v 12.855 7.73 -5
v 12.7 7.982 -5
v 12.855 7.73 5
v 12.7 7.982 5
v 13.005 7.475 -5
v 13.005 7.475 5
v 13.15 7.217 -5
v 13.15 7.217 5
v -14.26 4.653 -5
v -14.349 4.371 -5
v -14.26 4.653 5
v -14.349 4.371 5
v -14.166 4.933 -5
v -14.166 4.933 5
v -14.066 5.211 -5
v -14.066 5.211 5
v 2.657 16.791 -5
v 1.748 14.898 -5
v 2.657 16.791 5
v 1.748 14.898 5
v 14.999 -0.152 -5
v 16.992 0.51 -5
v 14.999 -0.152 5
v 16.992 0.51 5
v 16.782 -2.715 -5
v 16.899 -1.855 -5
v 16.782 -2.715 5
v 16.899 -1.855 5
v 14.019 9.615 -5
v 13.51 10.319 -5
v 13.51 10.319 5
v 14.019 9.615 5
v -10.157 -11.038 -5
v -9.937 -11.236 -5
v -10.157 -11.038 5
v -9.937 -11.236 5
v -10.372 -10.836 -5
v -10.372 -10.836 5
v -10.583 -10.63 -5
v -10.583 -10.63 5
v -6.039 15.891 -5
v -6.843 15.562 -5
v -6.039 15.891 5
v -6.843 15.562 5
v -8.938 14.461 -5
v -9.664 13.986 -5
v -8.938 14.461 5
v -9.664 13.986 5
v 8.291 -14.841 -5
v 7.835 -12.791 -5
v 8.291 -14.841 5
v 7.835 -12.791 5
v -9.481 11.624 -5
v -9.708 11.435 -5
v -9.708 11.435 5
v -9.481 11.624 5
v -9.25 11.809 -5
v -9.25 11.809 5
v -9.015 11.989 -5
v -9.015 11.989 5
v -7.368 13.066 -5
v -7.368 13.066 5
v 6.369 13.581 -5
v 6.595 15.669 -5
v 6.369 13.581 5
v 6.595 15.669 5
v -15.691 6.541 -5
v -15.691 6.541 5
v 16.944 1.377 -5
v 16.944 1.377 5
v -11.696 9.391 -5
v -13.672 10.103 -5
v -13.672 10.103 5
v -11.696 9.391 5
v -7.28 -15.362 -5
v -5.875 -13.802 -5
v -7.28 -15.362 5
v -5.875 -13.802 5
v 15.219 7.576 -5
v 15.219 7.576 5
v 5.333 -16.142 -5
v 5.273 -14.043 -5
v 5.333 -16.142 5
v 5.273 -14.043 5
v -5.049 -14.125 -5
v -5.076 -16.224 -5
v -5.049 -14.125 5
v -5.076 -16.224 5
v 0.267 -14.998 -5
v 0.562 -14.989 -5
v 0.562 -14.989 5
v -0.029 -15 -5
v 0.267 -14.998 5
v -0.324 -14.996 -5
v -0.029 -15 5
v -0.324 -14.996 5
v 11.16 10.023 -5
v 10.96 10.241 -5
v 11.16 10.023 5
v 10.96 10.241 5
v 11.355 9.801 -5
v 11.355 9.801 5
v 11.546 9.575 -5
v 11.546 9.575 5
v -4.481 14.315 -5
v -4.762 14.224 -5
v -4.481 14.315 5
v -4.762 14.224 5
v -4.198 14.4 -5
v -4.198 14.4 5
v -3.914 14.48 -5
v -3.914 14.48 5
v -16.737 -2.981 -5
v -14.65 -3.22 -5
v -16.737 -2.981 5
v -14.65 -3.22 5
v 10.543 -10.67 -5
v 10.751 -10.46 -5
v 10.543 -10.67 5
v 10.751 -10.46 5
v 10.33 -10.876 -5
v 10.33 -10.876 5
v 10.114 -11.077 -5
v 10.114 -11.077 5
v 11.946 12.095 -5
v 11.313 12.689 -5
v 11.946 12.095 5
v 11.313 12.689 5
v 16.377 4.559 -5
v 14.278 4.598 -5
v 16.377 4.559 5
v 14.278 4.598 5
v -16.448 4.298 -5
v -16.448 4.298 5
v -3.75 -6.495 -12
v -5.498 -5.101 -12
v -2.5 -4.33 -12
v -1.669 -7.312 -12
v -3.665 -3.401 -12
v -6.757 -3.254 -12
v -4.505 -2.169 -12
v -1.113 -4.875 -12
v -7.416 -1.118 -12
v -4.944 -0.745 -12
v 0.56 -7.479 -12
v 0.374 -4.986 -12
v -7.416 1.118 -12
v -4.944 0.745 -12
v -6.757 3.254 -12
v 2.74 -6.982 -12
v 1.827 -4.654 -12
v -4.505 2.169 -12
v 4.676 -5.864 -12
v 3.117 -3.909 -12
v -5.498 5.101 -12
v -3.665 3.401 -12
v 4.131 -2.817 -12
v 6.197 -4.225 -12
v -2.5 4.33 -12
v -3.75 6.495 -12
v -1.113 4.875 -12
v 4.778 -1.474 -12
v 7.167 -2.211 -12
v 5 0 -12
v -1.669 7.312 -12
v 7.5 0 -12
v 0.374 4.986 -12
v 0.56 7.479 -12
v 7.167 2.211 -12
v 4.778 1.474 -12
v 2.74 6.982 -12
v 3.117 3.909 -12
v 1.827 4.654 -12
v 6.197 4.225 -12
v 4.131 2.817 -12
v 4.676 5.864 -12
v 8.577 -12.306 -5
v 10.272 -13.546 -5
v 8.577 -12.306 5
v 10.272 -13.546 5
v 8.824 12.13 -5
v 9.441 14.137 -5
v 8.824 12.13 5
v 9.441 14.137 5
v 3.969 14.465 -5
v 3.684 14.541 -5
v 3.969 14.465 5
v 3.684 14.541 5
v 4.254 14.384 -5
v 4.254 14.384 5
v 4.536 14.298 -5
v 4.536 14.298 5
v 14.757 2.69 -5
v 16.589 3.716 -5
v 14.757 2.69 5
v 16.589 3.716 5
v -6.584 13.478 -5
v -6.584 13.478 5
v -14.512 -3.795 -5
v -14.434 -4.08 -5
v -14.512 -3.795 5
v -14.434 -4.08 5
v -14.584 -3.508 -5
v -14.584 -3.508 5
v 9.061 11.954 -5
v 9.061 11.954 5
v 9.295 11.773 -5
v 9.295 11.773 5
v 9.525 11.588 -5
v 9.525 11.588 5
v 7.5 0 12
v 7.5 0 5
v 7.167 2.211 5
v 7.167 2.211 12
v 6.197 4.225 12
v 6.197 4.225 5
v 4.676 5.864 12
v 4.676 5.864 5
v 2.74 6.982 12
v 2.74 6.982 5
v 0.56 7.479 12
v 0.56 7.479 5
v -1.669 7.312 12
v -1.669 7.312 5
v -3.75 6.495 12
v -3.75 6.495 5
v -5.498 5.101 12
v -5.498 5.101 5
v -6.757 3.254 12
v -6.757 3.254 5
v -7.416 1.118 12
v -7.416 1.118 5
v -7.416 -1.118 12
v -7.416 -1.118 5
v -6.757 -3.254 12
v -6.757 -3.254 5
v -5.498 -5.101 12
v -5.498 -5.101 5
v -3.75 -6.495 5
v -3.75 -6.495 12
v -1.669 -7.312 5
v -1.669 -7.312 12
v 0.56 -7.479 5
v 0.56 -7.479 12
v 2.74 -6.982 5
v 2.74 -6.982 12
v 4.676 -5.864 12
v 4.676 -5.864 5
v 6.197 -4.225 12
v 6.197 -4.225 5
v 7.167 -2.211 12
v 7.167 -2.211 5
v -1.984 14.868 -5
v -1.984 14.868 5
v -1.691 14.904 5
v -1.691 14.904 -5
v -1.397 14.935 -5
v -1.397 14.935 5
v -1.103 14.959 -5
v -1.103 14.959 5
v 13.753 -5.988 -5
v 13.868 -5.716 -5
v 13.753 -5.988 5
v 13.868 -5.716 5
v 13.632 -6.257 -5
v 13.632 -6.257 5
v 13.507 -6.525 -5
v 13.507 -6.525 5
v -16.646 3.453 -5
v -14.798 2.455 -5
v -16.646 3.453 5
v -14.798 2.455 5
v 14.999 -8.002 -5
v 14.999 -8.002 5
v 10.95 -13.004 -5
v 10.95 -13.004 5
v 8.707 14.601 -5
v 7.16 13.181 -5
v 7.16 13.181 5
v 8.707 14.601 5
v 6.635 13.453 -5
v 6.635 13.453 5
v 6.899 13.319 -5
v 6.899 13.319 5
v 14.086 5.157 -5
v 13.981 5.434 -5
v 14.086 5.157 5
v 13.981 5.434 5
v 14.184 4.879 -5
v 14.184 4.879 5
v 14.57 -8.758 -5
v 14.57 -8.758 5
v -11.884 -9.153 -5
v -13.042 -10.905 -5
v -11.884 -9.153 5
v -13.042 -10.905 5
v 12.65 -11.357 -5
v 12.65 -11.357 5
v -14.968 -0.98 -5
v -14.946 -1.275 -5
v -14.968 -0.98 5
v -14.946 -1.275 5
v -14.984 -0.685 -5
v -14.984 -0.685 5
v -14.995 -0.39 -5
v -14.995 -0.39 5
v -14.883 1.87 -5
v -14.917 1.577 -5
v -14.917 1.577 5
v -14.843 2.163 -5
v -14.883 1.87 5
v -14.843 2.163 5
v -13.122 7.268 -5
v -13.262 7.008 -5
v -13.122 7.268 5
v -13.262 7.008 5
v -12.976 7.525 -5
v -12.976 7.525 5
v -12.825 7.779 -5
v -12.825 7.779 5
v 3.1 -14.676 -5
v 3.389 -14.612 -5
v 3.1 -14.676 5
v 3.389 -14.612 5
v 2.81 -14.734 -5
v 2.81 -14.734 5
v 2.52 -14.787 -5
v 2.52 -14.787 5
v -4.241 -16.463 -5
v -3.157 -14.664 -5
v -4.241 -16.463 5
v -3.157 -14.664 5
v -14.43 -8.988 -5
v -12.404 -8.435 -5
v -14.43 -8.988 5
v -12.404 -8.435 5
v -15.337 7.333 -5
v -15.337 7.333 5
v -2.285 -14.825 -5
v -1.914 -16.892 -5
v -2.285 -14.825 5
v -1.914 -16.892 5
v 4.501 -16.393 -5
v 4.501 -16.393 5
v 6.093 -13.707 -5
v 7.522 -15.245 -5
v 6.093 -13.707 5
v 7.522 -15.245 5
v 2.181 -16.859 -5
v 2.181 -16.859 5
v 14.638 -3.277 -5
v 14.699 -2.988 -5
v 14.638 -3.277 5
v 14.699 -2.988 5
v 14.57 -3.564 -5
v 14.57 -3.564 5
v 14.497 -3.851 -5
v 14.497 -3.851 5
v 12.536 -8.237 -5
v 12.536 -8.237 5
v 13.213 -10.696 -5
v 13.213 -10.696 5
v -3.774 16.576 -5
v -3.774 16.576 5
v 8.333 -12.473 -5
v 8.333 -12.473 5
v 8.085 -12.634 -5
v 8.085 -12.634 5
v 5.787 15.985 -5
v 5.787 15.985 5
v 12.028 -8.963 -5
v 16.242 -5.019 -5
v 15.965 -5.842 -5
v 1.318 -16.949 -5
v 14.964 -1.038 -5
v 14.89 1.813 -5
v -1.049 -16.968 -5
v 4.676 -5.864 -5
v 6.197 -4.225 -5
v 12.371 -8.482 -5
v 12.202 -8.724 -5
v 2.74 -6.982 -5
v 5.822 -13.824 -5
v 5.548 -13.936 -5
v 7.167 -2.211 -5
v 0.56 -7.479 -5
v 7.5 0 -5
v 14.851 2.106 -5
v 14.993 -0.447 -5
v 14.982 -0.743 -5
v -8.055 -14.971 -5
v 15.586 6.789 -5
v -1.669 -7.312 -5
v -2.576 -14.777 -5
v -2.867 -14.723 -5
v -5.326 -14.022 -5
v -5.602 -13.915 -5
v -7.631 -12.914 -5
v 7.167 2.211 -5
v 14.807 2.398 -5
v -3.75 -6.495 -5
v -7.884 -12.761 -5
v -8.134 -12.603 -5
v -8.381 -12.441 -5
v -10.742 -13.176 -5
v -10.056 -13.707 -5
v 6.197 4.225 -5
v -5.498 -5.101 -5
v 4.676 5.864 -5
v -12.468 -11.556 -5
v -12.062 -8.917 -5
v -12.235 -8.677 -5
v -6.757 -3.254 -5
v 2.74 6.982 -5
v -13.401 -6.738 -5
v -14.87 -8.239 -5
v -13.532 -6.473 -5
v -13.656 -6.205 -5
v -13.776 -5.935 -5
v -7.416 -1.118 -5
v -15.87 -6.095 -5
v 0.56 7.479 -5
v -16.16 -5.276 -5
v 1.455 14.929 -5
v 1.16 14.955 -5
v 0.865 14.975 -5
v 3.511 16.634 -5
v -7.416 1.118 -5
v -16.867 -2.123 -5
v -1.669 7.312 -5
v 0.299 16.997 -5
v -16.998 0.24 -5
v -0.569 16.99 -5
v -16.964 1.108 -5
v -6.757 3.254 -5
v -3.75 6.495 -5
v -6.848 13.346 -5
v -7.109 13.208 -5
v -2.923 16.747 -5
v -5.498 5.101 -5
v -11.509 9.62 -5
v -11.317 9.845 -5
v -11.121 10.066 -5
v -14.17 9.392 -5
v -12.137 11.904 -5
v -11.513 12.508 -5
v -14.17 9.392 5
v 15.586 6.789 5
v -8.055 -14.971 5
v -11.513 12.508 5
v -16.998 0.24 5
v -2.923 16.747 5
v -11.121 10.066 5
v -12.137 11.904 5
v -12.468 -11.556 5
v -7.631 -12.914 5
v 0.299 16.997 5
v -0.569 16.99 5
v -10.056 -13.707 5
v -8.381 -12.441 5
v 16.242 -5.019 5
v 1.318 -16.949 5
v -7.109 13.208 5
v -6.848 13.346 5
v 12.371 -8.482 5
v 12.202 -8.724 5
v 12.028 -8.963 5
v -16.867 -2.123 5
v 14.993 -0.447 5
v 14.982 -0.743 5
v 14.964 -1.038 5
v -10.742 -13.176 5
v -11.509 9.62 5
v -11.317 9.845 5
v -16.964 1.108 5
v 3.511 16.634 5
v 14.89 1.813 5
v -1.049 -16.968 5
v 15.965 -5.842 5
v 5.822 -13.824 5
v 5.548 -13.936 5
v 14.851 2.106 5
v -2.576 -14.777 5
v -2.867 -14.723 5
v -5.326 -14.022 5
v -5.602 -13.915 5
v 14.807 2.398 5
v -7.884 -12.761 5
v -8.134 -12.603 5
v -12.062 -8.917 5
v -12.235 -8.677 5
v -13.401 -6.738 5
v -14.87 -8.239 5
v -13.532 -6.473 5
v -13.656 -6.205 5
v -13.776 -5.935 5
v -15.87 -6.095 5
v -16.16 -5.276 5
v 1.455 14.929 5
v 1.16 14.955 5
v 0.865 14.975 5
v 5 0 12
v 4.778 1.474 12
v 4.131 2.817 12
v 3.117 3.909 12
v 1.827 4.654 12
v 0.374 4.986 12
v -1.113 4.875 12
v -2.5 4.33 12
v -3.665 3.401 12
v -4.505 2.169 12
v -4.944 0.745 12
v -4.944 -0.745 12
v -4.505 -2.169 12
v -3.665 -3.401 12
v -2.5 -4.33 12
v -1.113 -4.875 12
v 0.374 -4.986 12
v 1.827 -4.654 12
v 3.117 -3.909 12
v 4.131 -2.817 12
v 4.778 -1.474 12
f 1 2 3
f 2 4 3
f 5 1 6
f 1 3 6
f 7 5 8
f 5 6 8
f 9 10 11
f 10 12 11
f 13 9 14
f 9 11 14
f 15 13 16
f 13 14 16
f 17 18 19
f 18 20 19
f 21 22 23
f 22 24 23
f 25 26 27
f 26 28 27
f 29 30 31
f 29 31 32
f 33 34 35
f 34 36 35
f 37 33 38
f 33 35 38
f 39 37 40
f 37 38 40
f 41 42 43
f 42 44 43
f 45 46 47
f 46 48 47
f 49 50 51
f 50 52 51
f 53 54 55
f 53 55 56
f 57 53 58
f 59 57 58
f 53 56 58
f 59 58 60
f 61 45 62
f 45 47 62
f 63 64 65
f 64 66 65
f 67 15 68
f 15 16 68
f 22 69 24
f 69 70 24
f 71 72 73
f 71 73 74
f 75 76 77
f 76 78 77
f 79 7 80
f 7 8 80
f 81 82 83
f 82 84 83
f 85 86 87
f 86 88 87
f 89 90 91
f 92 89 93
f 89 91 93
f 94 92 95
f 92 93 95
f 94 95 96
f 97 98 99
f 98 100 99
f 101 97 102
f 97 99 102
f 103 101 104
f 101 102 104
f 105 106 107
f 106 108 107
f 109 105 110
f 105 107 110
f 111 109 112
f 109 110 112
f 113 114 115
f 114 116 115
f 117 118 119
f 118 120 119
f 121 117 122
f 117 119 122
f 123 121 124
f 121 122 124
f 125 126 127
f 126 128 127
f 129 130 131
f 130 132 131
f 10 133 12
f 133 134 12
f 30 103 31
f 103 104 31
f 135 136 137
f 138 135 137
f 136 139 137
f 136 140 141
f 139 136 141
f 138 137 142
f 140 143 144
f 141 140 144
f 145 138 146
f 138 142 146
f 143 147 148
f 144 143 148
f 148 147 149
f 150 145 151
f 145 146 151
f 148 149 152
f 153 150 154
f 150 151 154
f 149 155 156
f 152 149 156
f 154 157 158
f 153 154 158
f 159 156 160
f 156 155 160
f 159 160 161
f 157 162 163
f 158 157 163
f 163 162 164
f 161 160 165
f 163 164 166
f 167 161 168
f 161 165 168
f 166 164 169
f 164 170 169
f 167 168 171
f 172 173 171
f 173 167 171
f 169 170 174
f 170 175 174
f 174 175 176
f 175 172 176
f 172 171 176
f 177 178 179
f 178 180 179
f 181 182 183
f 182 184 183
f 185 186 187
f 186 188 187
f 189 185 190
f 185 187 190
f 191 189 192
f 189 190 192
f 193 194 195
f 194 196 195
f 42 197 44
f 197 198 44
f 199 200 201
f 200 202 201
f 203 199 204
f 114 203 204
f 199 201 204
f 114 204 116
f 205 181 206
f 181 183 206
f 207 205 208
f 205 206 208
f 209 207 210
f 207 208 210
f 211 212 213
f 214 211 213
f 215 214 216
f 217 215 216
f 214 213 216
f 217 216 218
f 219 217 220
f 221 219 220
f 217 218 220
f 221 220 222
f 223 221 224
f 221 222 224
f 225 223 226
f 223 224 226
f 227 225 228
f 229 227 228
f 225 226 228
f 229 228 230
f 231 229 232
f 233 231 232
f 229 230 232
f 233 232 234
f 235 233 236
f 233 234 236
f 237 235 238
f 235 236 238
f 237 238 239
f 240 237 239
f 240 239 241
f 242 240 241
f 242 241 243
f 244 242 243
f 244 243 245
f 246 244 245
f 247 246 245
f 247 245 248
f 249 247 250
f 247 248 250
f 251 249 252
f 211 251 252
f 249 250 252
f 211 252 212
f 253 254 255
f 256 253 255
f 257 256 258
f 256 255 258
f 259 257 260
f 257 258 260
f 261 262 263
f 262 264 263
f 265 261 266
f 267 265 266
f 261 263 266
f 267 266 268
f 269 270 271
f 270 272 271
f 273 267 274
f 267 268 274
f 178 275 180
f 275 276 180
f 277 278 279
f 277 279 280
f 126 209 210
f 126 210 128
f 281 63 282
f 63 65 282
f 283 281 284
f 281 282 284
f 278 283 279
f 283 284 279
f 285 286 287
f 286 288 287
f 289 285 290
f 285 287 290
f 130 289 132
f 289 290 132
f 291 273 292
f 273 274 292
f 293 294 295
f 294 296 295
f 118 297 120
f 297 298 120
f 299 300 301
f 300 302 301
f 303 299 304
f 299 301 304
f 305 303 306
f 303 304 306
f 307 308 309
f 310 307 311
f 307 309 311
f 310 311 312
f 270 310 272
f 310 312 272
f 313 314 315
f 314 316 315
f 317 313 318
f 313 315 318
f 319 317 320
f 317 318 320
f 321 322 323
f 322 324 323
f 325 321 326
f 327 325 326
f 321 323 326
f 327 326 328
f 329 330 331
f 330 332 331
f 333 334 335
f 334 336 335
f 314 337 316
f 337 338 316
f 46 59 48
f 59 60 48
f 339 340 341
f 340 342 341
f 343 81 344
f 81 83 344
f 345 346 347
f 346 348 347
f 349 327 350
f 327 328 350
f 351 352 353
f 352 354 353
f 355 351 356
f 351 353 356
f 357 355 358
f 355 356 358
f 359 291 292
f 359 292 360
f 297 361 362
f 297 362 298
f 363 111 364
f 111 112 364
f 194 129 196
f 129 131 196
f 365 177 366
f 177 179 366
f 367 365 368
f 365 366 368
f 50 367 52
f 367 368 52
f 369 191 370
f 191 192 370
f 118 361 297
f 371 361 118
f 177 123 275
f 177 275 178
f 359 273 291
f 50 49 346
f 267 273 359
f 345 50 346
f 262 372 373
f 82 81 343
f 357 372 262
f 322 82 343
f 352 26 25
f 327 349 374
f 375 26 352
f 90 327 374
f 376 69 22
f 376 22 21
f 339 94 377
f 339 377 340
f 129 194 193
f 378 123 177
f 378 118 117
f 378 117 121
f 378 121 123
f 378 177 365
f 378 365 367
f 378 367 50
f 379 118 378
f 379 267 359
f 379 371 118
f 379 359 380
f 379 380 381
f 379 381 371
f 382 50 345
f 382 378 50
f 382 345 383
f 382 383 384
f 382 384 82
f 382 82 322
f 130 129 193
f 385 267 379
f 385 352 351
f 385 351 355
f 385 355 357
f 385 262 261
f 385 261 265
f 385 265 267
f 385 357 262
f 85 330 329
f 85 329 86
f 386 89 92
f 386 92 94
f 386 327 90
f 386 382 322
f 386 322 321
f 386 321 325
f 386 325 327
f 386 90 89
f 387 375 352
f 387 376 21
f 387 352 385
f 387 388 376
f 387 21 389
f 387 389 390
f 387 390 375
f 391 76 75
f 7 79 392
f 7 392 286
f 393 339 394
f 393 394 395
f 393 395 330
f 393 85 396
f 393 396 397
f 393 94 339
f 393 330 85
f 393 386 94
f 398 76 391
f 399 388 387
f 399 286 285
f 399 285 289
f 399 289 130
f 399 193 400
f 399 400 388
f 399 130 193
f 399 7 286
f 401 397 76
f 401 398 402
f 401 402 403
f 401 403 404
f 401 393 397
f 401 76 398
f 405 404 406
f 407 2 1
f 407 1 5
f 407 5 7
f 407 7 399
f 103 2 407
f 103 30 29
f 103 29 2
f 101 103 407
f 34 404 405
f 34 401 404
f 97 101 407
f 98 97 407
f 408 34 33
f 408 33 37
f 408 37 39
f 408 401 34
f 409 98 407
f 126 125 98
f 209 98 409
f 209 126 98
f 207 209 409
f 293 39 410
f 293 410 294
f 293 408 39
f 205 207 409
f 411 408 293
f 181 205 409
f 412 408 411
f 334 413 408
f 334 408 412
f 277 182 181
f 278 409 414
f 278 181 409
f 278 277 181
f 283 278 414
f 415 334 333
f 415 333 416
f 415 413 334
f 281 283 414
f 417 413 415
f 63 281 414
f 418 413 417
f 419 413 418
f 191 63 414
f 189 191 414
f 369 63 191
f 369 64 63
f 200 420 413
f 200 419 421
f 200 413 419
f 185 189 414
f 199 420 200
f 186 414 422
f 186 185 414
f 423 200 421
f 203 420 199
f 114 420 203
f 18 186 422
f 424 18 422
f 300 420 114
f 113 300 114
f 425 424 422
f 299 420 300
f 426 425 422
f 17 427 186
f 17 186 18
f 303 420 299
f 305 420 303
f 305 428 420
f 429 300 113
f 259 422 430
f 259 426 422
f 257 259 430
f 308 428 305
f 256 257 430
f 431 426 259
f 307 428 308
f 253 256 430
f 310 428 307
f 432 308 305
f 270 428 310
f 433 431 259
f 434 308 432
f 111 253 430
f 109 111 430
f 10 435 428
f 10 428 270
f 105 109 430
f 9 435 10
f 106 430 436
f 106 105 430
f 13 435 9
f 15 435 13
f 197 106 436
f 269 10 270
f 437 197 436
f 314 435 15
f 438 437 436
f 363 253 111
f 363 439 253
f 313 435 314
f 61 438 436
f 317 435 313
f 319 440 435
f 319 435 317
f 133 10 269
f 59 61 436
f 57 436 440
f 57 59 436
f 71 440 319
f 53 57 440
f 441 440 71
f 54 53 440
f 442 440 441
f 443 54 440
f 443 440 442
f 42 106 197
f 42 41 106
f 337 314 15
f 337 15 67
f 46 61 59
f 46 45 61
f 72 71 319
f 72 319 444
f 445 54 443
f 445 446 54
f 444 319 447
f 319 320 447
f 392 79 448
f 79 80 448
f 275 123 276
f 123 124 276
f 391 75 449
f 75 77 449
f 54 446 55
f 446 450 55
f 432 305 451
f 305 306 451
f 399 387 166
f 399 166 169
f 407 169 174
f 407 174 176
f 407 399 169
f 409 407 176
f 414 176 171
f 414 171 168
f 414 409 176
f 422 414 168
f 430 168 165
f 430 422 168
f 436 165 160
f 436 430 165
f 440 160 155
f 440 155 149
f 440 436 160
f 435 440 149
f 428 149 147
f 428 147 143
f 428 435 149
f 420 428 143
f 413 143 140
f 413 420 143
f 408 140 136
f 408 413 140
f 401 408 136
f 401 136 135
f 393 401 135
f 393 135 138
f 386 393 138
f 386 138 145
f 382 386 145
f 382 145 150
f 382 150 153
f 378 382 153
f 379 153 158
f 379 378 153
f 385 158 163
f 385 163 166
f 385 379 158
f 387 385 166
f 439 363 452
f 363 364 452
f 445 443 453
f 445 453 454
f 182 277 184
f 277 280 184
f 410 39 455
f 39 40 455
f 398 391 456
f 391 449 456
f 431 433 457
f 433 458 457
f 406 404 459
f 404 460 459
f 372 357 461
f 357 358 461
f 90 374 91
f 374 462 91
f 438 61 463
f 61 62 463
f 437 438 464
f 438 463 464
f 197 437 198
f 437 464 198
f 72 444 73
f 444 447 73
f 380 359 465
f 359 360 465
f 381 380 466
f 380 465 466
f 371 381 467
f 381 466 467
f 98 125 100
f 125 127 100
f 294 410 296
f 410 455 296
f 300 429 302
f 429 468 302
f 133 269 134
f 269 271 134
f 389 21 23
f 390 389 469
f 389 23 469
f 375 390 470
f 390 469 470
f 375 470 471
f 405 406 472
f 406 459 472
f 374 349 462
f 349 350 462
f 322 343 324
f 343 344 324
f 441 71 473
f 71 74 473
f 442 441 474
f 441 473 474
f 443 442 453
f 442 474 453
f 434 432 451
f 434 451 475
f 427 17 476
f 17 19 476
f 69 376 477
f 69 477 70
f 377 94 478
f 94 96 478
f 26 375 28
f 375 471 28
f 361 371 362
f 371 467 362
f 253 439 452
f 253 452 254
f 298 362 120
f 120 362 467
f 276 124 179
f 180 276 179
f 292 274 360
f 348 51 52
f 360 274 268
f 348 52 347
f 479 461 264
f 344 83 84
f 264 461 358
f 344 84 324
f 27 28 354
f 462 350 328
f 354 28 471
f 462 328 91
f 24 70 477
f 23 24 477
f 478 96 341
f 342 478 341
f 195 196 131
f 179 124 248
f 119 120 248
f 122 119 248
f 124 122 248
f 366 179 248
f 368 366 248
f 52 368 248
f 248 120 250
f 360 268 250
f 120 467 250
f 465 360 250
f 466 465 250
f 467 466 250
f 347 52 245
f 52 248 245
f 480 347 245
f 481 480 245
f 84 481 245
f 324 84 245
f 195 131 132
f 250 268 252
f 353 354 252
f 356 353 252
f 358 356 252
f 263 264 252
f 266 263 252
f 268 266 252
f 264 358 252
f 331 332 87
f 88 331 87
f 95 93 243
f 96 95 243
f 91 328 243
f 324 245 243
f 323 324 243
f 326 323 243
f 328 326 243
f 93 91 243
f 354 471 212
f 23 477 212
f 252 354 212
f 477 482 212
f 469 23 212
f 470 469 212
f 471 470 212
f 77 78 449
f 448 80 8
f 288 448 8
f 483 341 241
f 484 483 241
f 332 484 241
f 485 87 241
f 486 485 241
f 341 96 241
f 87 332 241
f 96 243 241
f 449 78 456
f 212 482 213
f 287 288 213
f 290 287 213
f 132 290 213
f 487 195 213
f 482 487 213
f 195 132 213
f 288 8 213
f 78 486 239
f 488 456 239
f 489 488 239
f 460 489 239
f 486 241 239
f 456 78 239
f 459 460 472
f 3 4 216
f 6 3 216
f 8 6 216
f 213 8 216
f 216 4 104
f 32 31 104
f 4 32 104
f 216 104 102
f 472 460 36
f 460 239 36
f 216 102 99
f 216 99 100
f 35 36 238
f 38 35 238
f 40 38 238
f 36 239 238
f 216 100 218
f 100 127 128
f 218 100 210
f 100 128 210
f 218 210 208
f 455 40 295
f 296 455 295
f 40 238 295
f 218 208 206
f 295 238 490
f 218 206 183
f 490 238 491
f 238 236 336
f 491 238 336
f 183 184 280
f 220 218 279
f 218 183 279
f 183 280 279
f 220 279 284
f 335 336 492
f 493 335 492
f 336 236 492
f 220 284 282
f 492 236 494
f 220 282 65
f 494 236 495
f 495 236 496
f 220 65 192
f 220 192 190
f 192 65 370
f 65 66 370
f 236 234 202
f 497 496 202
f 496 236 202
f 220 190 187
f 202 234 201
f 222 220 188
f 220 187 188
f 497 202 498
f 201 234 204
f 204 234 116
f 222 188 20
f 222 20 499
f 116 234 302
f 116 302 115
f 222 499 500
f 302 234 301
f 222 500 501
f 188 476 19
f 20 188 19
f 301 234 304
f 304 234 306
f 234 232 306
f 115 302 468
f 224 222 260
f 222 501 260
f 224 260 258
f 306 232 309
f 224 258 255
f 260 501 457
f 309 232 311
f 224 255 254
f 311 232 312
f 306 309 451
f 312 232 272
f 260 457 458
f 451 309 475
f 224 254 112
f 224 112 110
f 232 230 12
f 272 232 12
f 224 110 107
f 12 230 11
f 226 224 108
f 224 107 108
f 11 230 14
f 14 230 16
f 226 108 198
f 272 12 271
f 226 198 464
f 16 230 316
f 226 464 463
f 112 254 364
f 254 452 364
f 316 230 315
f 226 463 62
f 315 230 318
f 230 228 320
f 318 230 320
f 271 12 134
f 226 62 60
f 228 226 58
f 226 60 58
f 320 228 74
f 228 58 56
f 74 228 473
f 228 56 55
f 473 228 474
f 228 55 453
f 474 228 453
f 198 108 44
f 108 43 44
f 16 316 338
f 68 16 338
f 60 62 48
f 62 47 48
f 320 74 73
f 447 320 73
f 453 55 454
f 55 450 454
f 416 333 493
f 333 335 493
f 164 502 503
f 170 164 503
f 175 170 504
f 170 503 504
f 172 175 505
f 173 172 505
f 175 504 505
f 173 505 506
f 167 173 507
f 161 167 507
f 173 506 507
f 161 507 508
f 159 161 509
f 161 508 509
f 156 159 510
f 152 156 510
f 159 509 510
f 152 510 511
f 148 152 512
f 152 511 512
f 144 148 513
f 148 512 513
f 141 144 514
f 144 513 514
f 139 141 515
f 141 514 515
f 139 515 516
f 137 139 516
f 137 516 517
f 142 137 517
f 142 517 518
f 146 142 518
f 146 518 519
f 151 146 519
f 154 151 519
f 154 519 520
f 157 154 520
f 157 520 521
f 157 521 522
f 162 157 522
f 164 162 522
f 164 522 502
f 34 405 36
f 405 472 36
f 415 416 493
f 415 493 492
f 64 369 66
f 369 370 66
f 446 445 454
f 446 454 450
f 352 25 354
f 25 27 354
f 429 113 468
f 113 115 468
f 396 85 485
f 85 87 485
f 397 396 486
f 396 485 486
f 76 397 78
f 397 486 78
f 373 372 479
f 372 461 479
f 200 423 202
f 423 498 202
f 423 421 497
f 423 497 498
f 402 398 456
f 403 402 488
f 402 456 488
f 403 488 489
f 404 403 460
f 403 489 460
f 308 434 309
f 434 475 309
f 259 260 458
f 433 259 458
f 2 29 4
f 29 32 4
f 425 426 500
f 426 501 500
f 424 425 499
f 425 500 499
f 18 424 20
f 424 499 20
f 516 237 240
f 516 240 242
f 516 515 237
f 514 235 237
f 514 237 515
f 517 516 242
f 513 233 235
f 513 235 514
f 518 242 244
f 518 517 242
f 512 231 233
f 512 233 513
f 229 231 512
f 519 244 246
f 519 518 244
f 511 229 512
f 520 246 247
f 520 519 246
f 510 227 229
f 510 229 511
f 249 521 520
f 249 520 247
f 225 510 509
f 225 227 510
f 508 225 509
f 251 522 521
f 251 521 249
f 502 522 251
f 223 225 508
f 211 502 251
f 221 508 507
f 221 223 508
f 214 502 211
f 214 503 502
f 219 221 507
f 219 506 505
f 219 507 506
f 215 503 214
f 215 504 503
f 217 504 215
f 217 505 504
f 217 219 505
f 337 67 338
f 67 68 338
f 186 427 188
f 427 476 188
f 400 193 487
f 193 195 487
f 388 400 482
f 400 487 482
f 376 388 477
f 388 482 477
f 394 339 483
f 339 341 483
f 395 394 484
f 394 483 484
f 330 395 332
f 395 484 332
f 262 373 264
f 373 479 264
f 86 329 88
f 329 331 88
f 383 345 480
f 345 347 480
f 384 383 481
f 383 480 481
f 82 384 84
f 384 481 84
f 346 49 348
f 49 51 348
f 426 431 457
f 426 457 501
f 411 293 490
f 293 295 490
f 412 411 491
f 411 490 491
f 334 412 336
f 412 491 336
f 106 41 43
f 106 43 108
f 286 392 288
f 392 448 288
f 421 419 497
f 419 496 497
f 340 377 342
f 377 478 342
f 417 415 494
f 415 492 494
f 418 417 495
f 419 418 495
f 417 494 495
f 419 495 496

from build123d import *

# Parameters (mm, degrees)
BOSS_EXTRUDE1_DEPTH     = 5
SKETCH2_R               = 7.5
BOSS_EXTRUDE2_DEPTH     = 7
SKETCH3_R               = 5
CUT_EXTRUDE1_DEPTH      = 1
CUT_EXTRUDE1_DEPTH_BACK = 25


with BuildPart() as part:
    # Sketch1 → Boss-Extrude1 (new body, symmetric)
    with BuildSketch(Plane.XY):
        with BuildLine():
            Line((-1.102638188, 14.959418071), (-0.56896822, 16.990476013))
            Line((-0.56896822, 16.990476013), (0.299469927, 16.997362082))
            Line((0.299469927, 16.997362082), (0.865280327, 14.975022202))
            ThreePointArc((0.865280327, 14.975022202), (1.307399264, 14.942914949), (1.748376405, 14.897757548))
            Line((1.748376405, 14.897757548), (2.656782505, 16.791113921))
            Line((2.656782505, 16.791113921), (3.51083004, 16.63352255))
            Line((3.51083004, 16.63352255), (3.68368517, 14.540648664))
            ThreePointArc((3.68368517, 14.540648664), (4.111738104, 14.425450071), (4.53620012, 14.29765325))
            Line((4.53620012, 14.29765325), (5.786510188, 15.984877223))
            Line((5.786510188, 15.984877223), (6.595299608, 15.668504175))
            Line((6.595299608, 15.668504175), (6.368952034, 13.580738198))
            ThreePointArc((6.368952034, 13.580738198), (6.767468017, 13.386611843), (7.160073744, 13.180794513))
            Line((7.160073744, 13.180794513), (8.707098316, 14.600905414))
            Line((8.707098316, 14.600905414), (9.441397865, 14.137185235))
            Line((9.441397865, 14.137185235), (8.824028377, 12.129984469))
            ThreePointArc((8.824028377, 12.129984469), (9.178604003, 11.863946585), (9.525163646, 11.587547519))
            Line((9.525163646, 11.587547519), (11.312989225, 12.689218841))
            Line((11.312989225, 12.689218841), (11.946259403, 12.094911586))
            Line((11.946259403, 12.094911586), (10.960181343, 10.240821497))
            ThreePointArc((10.960181343, 10.240821497), (11.258001325, 9.912487385), (11.545989318, 9.575496367))
            Line((11.545989318, 9.575496367), (13.509999227, 10.318910838))
            Line((13.509999227, 10.318910838), (14.019352001, 9.61549632))
            Line((14.019352001, 9.61549632), (12.7002048, 7.981528553))
            ThreePointArc((12.7002048, 7.981528553), (12.930505147, 7.602765065), (13.149512852, 7.217361828))
            Line((13.149512852, 7.217361828), (15.218722658, 7.575650511))
            Line((15.218722658, 7.575650511), (15.58574869, 6.788551963))
            Line((15.58574869, 6.788551963), (13.981209764, 5.433762373))
            ThreePointArc((13.981209764, 5.433762373), (14.135666823, 5.018259007), (14.277778731, 4.598373027))
            Line((14.277778731, 4.598373027), (16.377401799, 4.558586437))
            Line((16.377401799, 4.558586437), (16.588835814, 3.716251652))
            Line((16.588835814, 3.716251652), (14.756897381, 2.689605862))
            ThreePointArc((14.756897381, 2.689605862), (14.82992867, 2.252379993), (14.890008487, 1.813187044))
            Line((14.890008487, 1.813187044), (16.944158969, 1.376763172))
            Line((16.944158969, 1.376763172), (16.992359189, 0.509636323))
            Line((16.992359189, 0.509636323), (14.999232277, -0.151760012))
            ThreePointArc((14.999232277, -0.151760012), (14.988198256, -0.594905903), (14.96407454, -1.037532242))
            Line((14.96407454, -1.037532242), (16.898510086, -1.854819902))
            Line((16.898510086, -1.854819902), (16.78173443, -2.715398591))
            Line((16.78173443, -2.715398591), (14.699455839, -2.987640883))
            ThreePointArc((14.699455839, -2.987640883), (14.604755306, -3.420690349), (14.497299951, -3.85075241))
            Line((14.497299951, -3.85075241), (16.24210502, -5.019364952))
            Line((16.24210502, -5.019364952), (15.964574065, -5.842291924))
            Line((15.964574065, -5.842291924), (13.868402767, -5.715540629))
            ThreePointArc((13.868402767, -5.715540629), (13.693458446, -6.122842133), (13.506555169, -6.524796354))
            Line((13.506555169, -6.524796354), (14.99866796, -8.002497074))
            Line((14.99866796, -8.002497074), (14.570412397, -8.758029606))
            Line((14.570412397, -8.758029606), (12.536109486, -8.236865845))
            ThreePointArc((12.536109486, -8.236865845), (12.28724432, -8.60369845), (12.027648293, -8.963017156))
            Line((12.027648293, -8.963017156), (13.213139961, -10.696398102))
            Line((13.213139961, -10.696398102), (12.649638063, -11.357229278))
            Line((12.649638063, -11.357229278), (10.750728545, -10.460489269))
            ThreePointArc((10.750728545, -10.460489269), (10.436937171, -10.773594688), (10.114030869, -11.077291166))
            Line((10.114030869, -11.077291166), (10.950054658, -13.003703433))
            Line((10.950054658, -13.003703433), (10.271672851, -13.545949094))
            Line((10.271672851, -13.545949094), (8.576788264, -12.306043355))
            ThreePointArc((8.576788264, -12.306043355), (8.209411919, -12.554105143), (7.834866018, -12.791203011))
            Line((7.834866018, -12.791203011), (8.291205849, -14.841021042))
            Line((8.291205849, -14.841021042), (7.522462619, -15.245083015))
            Line((7.522462619, -15.245083015), (6.092860509, -13.706824972))
            ThreePointArc((6.092860509, -13.706824972), (5.68517713, -13.88087753), (5.272528696, -14.042807453))
            Line((5.272528696, -14.042807453), (5.332691259, -16.141945482))
            Line((5.332691259, -16.141945482), (4.501370988, -16.393219916))
            Line((4.501370988, -16.393219916), (3.3887209, -14.612206222))
            ThreePointArc((3.3887209, -14.612206222), (2.955465228, -14.705958836), (2.519628449, -14.786868244))
            Line((2.519628449, -14.786868244), (2.181439312, -16.859457955))
            Line((2.181439312, -16.859457955), (1.317588082, -16.948863137))
            Line((1.317588082, -16.948863137), (0.562104089, -14.989464266))
            ThreePointArc((0.562104089, -14.989464266), (0.118935112, -14.999528474), (-0.324337735, -14.996493091))
            Line((-0.324337735, -14.996493091), (-1.048655536, -16.96762569))
            Line((-1.048655536, -16.96762569), (-1.91381589, -16.891930285))
            Line((-1.91381589, -16.891930285), (-2.284828629, -14.824964018))
            ThreePointArc((-2.284828629, -14.824964018), (-2.721893629, -14.750976072), (-3.156581508, -14.664105605))
            Line((-3.156581508, -14.664105605), (-4.24084924, -16.462539225))
            Line((-4.24084924, -16.462539225), (-5.07604957, -16.22447906))
            Line((-5.07604957, -16.22447906), (-5.049181687, -14.124650944))
            ThreePointArc((-5.049181687, -14.124650944), (-5.464346042, -13.969284961), (-5.874738201, -13.801719134))
            Line((-5.874738201, -13.801719134), (-7.279767603, -15.362453699))
            Line((-7.279767603, -15.362453699), (-8.054821592, -14.97063289))
            Line((-8.054821592, -14.97063289), (-7.631044164, -12.913836183))
            ThreePointArc((-7.631044164, -12.913836183), (-8.009302753, -12.682707496), (-8.380566549, -12.440502575))
            Line((-8.380566549, -12.440502575), (-10.055576198, -13.70712907))
            Line((-10.055576198, -13.70712907), (-10.742471376, -13.175709041))
            Line((-10.742471376, -13.175709041), (-9.937100822, -11.236281736))
            ThreePointArc((-9.937100822, -11.236281736), (-10.264782393, -10.937743936), (-10.583499387, -10.629653839))
            Line((-10.583499387, -10.629653839), (-12.467950069, -11.556393082))
            Line((-12.467950069, -11.556393082), (-13.041860255, -10.904580739))
            Line((-13.041860255, -10.904580739), (-11.884004765, -9.152618792))
            ThreePointArc((-11.884004765, -9.152618792), (-12.149266054, -8.797461813), (-12.403916981, -8.434621718))
            Line((-12.403916981, -8.434621718), (-14.42969974, -8.987978939))
            Line((-14.42969974, -8.987978939), (-14.869882324, -8.239332477))
            Line((-14.869882324, -8.239332477), (-13.401389813, -6.738156357))
            ThreePointArc((-13.401389813, -6.738156357), (-13.594643584, -6.339216499), (-13.776024698, -5.934740391))
            Line((-13.776024698, -5.934740391), (-15.869922466, -6.094715819))
            Line((-15.869922466, -6.094715819), (-16.160468103, -5.276293272))
            Line((-16.160468103, -5.276293272), (-14.434413716, -4.080159395))
            ThreePointArc((-14.434413716, -4.080159395), (-14.548675275, -3.651855384), (-14.650230989, -3.220362085))
            Line((-14.650230989, -3.220362085), (-16.736564846, -2.98117379))
            Line((-16.736564846, -2.98117379), (-16.866972459, -2.122555081))
            Line((-16.866972459, -2.122555081), (-14.945740298, -1.274694842))
            ThreePointArc((-14.945740298, -1.274694842), (-14.976879935, -0.8325067), (-14.994939762, -0.389591502))
            Line((-14.994939762, -0.389591502), (-16.998304165, 0.240115627))
            Line((-16.998304165, 0.240115627), (-16.963860484, 1.107897781))
            Line((-16.963860484, 1.107897781), (-14.916888886, 1.576840503))
            ThreePointArc((-14.916888886, 1.576840503), (-14.863781133, 2.016930945), (-14.797692342, 2.455259933))
            Line((-14.797692342, 2.455259933), (-16.645680483, 3.45272664))
            Line((-16.645680483, 3.45272664), (-16.447630392, 4.29830833))
            Line((-16.447630392, 4.29830833), (-14.348902243, 4.371384725))
            ThreePointArc((-14.348902243, 4.371384725), (-14.213466553, 4.793471451), (-14.065617767, 5.211371877))
            Line((-14.065617767, 5.211371877), (-15.691438539, 6.540547117))
            Line((-15.691438539, 6.540547117), (-15.336940083, 7.333366818))
            Line((-15.336940083, 7.333366818), (-13.262308888, 7.007935713))
            ThreePointArc((-13.262308888, 7.007935713), (-13.049440259, 7.396763409), (-12.825175117, 7.779131264))
            Line((-12.825175117, 7.779131264), (-14.170067122, 9.391975179))
            Line((-14.170067122, 9.391975179), (-13.6719328, 10.103378321))
            Line((-13.6719328, 10.103378321), (-11.696381135, 9.391201645))
            ThreePointArc((-11.696381135, 9.391201645), (-11.413773194, 9.732717065), (-11.121197223, 10.065732577))
            Line((-11.121197223, 10.065732577), (-12.136552559, 11.903952788))
            Line((-12.136552559, 11.903952788), (-11.512786244, 12.508227408))
            Line((-11.512786244, 12.508227408), (-9.707715693, 11.435045082))
            ThreePointArc((-9.707715693, 11.435045082), (-9.365582628, 11.716904968), (-9.015270286, 11.98853209))
            Line((-9.015270286, 11.98853209), (-9.664391366, 13.985690527))
            Line((-9.664391366, 13.985690527), (-8.937537597, 14.460996567))
            Line((-8.937537597, 14.460996567), (-7.368188113, 13.065596195))
            ThreePointArc((-7.368188113, 13.065596195), (-6.978895504, 13.277613398), (-6.583507991, 13.478034817))
            Line((-6.583507991, 13.478034817), (-6.842933888, 15.561948972))
            Line((-6.842933888, 15.561948972), (-6.039263054, 15.891107632))
            Line((-6.039263054, 15.891107632), (-4.762355017, 14.22392262))
            ThreePointArc((-4.762355017, 14.22392262), (-4.339972912, 14.358434285), (-3.913800564, 14.480406249))
            Line((-3.913800564, 14.480406249), (-3.774154951, 16.575758034))
            Line((-3.774154951, 16.575758034), (-2.92271381, 16.746872663))
            Line((-2.92271381, 16.746872663), (-1.984398002, 14.868159421))
            ThreePointArc((-1.984398002, 14.868159421), (-1.544192393, 14.920303946), (-1.102638188, 14.959418071))
        make_face()
    extrude(amount=BOSS_EXTRUDE1_DEPTH, both=True)

    # Sketch2 → Boss-Extrude2 (add)
    with BuildSketch(Plane.XY.offset(5)):
        Circle(SKETCH2_R)
    boss_extrude2 = extrude(amount=BOSS_EXTRUDE2_DEPTH)

    # Mirror1: Boss-Extrude2 across plane
    add(boss_extrude2.mirror(Plane.XY))

    # Sketch3 → Cut-Extrude1 (cut, two sides)
    with BuildSketch(Plane.XY.offset(12)) as cut_extrude1_sk:
        Circle(SKETCH3_R)
    extrude(amount=CUT_EXTRUDE1_DEPTH, mode=Mode.SUBTRACT)
    extrude(cut_extrude1_sk.sketch, amount=-CUT_EXTRUDE1_DEPTH_BACK, mode=Mode.SUBTRACT)


solid = part.part
